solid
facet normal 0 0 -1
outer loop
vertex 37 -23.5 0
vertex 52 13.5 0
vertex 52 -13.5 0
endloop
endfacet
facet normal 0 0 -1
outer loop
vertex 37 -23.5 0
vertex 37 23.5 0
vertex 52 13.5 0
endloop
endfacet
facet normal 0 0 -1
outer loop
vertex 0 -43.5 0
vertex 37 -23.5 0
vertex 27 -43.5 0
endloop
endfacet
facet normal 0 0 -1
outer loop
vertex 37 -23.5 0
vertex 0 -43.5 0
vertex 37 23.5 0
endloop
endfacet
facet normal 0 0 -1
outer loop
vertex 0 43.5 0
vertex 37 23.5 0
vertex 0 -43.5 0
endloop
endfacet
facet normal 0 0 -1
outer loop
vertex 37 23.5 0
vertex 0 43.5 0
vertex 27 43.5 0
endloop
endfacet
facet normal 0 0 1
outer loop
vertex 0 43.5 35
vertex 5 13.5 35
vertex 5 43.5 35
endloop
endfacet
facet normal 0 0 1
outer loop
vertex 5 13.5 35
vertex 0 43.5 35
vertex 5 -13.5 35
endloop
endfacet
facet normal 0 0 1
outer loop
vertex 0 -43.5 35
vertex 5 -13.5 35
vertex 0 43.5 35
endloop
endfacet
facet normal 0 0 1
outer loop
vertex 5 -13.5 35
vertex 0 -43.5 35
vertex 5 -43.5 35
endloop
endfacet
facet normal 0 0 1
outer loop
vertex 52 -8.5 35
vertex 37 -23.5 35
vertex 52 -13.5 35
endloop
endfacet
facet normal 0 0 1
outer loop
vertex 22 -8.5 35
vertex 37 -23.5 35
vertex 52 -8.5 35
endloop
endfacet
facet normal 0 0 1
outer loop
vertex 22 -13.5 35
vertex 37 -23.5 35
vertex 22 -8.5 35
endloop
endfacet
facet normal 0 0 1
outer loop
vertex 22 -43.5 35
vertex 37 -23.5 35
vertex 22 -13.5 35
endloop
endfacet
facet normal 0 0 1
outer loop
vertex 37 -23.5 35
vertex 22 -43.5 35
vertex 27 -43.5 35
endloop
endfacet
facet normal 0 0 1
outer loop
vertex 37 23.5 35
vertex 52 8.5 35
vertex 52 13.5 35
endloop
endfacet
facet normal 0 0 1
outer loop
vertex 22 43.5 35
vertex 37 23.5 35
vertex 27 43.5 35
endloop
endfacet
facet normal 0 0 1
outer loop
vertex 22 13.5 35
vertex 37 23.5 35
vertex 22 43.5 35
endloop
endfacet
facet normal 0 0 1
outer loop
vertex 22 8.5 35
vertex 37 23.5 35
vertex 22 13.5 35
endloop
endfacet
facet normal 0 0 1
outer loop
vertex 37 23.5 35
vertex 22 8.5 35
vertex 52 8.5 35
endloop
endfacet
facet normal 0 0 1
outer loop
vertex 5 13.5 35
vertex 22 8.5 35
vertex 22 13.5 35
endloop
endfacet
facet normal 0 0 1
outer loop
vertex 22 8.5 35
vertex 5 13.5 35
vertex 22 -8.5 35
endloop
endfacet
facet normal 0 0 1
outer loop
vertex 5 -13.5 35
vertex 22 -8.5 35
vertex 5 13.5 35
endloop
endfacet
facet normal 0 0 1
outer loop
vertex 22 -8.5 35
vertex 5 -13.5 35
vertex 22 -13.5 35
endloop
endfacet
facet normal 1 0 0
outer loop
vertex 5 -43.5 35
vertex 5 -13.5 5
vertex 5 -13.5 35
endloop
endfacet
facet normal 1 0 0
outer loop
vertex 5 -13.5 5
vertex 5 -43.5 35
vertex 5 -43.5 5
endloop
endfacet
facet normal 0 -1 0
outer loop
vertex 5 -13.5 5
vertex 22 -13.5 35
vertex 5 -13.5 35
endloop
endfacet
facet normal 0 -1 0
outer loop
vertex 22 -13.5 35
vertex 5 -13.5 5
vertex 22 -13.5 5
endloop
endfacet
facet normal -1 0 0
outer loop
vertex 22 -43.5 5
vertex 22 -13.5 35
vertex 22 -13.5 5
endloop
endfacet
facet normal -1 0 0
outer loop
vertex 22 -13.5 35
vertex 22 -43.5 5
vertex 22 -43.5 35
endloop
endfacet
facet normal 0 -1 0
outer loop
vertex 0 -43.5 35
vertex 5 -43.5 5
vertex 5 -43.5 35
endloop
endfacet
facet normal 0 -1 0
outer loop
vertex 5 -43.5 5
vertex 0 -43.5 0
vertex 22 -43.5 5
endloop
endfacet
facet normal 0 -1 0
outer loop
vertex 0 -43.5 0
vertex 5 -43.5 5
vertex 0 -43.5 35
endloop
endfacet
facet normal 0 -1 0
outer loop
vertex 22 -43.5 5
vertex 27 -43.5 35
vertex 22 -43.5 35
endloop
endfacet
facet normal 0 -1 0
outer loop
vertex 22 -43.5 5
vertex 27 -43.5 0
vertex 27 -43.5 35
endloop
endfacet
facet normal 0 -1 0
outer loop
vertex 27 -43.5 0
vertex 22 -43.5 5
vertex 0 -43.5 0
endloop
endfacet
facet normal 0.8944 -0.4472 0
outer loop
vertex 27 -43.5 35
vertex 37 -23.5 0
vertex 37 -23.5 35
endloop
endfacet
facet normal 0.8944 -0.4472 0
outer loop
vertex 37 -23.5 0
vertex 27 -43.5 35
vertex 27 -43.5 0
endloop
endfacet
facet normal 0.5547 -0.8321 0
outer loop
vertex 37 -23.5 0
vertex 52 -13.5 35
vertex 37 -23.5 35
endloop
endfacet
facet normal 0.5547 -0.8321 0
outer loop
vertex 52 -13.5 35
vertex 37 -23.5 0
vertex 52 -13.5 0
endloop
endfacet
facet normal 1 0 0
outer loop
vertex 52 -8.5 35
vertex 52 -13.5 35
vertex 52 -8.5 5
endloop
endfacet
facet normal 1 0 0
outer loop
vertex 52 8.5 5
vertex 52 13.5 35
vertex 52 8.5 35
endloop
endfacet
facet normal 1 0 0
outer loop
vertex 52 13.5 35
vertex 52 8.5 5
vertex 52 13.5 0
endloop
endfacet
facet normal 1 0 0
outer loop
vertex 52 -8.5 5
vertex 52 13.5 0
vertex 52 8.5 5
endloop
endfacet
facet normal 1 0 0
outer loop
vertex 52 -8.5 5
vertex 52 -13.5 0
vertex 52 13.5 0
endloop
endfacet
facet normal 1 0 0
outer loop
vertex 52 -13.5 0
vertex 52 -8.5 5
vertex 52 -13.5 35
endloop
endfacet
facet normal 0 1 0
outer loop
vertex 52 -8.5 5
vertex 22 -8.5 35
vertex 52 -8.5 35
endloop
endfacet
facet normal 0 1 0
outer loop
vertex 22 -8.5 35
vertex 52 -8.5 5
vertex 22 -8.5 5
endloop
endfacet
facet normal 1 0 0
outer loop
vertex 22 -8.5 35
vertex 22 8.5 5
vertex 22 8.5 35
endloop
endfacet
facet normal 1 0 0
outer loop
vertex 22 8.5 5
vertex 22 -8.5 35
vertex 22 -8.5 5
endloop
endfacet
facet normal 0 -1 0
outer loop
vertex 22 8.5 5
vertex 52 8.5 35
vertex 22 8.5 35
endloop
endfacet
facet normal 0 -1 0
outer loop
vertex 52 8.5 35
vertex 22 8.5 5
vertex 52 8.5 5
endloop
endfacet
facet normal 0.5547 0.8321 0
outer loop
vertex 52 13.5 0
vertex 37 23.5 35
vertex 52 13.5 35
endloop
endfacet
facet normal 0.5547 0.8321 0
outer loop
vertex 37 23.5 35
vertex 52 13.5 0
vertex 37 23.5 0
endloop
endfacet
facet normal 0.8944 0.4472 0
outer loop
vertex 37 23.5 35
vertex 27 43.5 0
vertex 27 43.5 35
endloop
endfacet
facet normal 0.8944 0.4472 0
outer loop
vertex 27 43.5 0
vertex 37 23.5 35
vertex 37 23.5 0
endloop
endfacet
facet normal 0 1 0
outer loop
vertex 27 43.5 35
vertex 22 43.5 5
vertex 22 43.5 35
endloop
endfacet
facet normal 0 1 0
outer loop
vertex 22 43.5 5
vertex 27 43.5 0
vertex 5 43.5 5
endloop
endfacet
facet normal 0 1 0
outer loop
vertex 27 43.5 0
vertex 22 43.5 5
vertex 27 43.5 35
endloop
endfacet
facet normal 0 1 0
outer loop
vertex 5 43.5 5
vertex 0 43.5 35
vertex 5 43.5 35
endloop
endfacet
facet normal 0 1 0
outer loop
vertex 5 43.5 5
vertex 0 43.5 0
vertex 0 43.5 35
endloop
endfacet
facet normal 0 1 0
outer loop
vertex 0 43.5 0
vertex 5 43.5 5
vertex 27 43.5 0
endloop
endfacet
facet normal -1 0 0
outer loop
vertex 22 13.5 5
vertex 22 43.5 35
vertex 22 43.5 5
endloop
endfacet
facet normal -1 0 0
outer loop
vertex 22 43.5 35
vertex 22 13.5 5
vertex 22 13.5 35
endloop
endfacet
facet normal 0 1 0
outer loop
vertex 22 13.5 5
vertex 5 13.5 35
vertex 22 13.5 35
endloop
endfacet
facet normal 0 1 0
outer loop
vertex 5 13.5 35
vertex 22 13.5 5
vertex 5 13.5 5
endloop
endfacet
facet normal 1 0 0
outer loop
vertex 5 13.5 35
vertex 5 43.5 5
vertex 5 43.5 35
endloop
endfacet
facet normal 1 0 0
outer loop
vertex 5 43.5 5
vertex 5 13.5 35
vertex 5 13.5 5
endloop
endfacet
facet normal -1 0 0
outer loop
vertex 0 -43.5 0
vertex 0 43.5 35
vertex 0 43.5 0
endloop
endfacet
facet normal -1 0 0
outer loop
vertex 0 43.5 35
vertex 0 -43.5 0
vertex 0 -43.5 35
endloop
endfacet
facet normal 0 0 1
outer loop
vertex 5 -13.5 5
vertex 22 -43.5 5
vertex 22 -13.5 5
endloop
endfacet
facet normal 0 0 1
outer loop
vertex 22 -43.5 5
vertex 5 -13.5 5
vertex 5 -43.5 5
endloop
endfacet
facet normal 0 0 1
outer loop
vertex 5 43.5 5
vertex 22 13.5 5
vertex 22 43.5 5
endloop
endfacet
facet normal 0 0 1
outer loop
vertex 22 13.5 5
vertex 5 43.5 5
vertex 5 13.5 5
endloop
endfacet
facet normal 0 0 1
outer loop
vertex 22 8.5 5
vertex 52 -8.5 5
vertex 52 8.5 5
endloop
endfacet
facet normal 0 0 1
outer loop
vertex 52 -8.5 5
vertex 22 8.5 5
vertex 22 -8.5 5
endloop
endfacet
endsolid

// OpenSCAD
thickness = 5;
ext = 30;
x = thickness*2;

plank_thickness = 17;

linear_extrude(height=30+thickness) body();
linear_extrude(height=thickness) base();

module body() {
    half_body();
    mirror([0, 1]) half_body();
    
    module half_body() {
    polygon([[0,0],  [0, thickness+plank_thickness/2+ext], [thickness, thickness+plank_thickness/2+ext], [thickness, thickness+plank_thickness/2], [thickness+plank_thickness, thickness+plank_thickness/2],
         [thickness+plank_thickness, thickness+plank_thickness/2+ext], [thickness+plank_thickness+thickness, thickness+plank_thickness/2+ext],
         [thickness+plank_thickness+thickness+x, plank_thickness/2 + thickness+x],
         [thickness+plank_thickness+ext, plank_thickness/2 + thickness], [thickness+plank_thickness+ext, plank_thickness/2], [plank_thickness+thickness*2, plank_thickness/2],
         [plank_thickness+thickness, plank_thickness/2], [plank_thickness+thickness, 0]]);
    }
}

module base() {
    half_base();
    mirror([0, 1]) half_base();
    
    module half_base() {
    polygon([[0,0],  [0, thickness+plank_thickness/2+ext],
         [thickness+plank_thickness, thickness+plank_thickness/2+ext], [thickness+plank_thickness+thickness, thickness+plank_thickness/2+ext],
         [thickness+plank_thickness+thickness, plank_thickness/2 + thickness],
         [thickness+plank_thickness+ext, plank_thickness/2 + thickness], [thickness+plank_thickness+ext, 0],
         [plank_thickness+thickness, 0]]);
    }
}
